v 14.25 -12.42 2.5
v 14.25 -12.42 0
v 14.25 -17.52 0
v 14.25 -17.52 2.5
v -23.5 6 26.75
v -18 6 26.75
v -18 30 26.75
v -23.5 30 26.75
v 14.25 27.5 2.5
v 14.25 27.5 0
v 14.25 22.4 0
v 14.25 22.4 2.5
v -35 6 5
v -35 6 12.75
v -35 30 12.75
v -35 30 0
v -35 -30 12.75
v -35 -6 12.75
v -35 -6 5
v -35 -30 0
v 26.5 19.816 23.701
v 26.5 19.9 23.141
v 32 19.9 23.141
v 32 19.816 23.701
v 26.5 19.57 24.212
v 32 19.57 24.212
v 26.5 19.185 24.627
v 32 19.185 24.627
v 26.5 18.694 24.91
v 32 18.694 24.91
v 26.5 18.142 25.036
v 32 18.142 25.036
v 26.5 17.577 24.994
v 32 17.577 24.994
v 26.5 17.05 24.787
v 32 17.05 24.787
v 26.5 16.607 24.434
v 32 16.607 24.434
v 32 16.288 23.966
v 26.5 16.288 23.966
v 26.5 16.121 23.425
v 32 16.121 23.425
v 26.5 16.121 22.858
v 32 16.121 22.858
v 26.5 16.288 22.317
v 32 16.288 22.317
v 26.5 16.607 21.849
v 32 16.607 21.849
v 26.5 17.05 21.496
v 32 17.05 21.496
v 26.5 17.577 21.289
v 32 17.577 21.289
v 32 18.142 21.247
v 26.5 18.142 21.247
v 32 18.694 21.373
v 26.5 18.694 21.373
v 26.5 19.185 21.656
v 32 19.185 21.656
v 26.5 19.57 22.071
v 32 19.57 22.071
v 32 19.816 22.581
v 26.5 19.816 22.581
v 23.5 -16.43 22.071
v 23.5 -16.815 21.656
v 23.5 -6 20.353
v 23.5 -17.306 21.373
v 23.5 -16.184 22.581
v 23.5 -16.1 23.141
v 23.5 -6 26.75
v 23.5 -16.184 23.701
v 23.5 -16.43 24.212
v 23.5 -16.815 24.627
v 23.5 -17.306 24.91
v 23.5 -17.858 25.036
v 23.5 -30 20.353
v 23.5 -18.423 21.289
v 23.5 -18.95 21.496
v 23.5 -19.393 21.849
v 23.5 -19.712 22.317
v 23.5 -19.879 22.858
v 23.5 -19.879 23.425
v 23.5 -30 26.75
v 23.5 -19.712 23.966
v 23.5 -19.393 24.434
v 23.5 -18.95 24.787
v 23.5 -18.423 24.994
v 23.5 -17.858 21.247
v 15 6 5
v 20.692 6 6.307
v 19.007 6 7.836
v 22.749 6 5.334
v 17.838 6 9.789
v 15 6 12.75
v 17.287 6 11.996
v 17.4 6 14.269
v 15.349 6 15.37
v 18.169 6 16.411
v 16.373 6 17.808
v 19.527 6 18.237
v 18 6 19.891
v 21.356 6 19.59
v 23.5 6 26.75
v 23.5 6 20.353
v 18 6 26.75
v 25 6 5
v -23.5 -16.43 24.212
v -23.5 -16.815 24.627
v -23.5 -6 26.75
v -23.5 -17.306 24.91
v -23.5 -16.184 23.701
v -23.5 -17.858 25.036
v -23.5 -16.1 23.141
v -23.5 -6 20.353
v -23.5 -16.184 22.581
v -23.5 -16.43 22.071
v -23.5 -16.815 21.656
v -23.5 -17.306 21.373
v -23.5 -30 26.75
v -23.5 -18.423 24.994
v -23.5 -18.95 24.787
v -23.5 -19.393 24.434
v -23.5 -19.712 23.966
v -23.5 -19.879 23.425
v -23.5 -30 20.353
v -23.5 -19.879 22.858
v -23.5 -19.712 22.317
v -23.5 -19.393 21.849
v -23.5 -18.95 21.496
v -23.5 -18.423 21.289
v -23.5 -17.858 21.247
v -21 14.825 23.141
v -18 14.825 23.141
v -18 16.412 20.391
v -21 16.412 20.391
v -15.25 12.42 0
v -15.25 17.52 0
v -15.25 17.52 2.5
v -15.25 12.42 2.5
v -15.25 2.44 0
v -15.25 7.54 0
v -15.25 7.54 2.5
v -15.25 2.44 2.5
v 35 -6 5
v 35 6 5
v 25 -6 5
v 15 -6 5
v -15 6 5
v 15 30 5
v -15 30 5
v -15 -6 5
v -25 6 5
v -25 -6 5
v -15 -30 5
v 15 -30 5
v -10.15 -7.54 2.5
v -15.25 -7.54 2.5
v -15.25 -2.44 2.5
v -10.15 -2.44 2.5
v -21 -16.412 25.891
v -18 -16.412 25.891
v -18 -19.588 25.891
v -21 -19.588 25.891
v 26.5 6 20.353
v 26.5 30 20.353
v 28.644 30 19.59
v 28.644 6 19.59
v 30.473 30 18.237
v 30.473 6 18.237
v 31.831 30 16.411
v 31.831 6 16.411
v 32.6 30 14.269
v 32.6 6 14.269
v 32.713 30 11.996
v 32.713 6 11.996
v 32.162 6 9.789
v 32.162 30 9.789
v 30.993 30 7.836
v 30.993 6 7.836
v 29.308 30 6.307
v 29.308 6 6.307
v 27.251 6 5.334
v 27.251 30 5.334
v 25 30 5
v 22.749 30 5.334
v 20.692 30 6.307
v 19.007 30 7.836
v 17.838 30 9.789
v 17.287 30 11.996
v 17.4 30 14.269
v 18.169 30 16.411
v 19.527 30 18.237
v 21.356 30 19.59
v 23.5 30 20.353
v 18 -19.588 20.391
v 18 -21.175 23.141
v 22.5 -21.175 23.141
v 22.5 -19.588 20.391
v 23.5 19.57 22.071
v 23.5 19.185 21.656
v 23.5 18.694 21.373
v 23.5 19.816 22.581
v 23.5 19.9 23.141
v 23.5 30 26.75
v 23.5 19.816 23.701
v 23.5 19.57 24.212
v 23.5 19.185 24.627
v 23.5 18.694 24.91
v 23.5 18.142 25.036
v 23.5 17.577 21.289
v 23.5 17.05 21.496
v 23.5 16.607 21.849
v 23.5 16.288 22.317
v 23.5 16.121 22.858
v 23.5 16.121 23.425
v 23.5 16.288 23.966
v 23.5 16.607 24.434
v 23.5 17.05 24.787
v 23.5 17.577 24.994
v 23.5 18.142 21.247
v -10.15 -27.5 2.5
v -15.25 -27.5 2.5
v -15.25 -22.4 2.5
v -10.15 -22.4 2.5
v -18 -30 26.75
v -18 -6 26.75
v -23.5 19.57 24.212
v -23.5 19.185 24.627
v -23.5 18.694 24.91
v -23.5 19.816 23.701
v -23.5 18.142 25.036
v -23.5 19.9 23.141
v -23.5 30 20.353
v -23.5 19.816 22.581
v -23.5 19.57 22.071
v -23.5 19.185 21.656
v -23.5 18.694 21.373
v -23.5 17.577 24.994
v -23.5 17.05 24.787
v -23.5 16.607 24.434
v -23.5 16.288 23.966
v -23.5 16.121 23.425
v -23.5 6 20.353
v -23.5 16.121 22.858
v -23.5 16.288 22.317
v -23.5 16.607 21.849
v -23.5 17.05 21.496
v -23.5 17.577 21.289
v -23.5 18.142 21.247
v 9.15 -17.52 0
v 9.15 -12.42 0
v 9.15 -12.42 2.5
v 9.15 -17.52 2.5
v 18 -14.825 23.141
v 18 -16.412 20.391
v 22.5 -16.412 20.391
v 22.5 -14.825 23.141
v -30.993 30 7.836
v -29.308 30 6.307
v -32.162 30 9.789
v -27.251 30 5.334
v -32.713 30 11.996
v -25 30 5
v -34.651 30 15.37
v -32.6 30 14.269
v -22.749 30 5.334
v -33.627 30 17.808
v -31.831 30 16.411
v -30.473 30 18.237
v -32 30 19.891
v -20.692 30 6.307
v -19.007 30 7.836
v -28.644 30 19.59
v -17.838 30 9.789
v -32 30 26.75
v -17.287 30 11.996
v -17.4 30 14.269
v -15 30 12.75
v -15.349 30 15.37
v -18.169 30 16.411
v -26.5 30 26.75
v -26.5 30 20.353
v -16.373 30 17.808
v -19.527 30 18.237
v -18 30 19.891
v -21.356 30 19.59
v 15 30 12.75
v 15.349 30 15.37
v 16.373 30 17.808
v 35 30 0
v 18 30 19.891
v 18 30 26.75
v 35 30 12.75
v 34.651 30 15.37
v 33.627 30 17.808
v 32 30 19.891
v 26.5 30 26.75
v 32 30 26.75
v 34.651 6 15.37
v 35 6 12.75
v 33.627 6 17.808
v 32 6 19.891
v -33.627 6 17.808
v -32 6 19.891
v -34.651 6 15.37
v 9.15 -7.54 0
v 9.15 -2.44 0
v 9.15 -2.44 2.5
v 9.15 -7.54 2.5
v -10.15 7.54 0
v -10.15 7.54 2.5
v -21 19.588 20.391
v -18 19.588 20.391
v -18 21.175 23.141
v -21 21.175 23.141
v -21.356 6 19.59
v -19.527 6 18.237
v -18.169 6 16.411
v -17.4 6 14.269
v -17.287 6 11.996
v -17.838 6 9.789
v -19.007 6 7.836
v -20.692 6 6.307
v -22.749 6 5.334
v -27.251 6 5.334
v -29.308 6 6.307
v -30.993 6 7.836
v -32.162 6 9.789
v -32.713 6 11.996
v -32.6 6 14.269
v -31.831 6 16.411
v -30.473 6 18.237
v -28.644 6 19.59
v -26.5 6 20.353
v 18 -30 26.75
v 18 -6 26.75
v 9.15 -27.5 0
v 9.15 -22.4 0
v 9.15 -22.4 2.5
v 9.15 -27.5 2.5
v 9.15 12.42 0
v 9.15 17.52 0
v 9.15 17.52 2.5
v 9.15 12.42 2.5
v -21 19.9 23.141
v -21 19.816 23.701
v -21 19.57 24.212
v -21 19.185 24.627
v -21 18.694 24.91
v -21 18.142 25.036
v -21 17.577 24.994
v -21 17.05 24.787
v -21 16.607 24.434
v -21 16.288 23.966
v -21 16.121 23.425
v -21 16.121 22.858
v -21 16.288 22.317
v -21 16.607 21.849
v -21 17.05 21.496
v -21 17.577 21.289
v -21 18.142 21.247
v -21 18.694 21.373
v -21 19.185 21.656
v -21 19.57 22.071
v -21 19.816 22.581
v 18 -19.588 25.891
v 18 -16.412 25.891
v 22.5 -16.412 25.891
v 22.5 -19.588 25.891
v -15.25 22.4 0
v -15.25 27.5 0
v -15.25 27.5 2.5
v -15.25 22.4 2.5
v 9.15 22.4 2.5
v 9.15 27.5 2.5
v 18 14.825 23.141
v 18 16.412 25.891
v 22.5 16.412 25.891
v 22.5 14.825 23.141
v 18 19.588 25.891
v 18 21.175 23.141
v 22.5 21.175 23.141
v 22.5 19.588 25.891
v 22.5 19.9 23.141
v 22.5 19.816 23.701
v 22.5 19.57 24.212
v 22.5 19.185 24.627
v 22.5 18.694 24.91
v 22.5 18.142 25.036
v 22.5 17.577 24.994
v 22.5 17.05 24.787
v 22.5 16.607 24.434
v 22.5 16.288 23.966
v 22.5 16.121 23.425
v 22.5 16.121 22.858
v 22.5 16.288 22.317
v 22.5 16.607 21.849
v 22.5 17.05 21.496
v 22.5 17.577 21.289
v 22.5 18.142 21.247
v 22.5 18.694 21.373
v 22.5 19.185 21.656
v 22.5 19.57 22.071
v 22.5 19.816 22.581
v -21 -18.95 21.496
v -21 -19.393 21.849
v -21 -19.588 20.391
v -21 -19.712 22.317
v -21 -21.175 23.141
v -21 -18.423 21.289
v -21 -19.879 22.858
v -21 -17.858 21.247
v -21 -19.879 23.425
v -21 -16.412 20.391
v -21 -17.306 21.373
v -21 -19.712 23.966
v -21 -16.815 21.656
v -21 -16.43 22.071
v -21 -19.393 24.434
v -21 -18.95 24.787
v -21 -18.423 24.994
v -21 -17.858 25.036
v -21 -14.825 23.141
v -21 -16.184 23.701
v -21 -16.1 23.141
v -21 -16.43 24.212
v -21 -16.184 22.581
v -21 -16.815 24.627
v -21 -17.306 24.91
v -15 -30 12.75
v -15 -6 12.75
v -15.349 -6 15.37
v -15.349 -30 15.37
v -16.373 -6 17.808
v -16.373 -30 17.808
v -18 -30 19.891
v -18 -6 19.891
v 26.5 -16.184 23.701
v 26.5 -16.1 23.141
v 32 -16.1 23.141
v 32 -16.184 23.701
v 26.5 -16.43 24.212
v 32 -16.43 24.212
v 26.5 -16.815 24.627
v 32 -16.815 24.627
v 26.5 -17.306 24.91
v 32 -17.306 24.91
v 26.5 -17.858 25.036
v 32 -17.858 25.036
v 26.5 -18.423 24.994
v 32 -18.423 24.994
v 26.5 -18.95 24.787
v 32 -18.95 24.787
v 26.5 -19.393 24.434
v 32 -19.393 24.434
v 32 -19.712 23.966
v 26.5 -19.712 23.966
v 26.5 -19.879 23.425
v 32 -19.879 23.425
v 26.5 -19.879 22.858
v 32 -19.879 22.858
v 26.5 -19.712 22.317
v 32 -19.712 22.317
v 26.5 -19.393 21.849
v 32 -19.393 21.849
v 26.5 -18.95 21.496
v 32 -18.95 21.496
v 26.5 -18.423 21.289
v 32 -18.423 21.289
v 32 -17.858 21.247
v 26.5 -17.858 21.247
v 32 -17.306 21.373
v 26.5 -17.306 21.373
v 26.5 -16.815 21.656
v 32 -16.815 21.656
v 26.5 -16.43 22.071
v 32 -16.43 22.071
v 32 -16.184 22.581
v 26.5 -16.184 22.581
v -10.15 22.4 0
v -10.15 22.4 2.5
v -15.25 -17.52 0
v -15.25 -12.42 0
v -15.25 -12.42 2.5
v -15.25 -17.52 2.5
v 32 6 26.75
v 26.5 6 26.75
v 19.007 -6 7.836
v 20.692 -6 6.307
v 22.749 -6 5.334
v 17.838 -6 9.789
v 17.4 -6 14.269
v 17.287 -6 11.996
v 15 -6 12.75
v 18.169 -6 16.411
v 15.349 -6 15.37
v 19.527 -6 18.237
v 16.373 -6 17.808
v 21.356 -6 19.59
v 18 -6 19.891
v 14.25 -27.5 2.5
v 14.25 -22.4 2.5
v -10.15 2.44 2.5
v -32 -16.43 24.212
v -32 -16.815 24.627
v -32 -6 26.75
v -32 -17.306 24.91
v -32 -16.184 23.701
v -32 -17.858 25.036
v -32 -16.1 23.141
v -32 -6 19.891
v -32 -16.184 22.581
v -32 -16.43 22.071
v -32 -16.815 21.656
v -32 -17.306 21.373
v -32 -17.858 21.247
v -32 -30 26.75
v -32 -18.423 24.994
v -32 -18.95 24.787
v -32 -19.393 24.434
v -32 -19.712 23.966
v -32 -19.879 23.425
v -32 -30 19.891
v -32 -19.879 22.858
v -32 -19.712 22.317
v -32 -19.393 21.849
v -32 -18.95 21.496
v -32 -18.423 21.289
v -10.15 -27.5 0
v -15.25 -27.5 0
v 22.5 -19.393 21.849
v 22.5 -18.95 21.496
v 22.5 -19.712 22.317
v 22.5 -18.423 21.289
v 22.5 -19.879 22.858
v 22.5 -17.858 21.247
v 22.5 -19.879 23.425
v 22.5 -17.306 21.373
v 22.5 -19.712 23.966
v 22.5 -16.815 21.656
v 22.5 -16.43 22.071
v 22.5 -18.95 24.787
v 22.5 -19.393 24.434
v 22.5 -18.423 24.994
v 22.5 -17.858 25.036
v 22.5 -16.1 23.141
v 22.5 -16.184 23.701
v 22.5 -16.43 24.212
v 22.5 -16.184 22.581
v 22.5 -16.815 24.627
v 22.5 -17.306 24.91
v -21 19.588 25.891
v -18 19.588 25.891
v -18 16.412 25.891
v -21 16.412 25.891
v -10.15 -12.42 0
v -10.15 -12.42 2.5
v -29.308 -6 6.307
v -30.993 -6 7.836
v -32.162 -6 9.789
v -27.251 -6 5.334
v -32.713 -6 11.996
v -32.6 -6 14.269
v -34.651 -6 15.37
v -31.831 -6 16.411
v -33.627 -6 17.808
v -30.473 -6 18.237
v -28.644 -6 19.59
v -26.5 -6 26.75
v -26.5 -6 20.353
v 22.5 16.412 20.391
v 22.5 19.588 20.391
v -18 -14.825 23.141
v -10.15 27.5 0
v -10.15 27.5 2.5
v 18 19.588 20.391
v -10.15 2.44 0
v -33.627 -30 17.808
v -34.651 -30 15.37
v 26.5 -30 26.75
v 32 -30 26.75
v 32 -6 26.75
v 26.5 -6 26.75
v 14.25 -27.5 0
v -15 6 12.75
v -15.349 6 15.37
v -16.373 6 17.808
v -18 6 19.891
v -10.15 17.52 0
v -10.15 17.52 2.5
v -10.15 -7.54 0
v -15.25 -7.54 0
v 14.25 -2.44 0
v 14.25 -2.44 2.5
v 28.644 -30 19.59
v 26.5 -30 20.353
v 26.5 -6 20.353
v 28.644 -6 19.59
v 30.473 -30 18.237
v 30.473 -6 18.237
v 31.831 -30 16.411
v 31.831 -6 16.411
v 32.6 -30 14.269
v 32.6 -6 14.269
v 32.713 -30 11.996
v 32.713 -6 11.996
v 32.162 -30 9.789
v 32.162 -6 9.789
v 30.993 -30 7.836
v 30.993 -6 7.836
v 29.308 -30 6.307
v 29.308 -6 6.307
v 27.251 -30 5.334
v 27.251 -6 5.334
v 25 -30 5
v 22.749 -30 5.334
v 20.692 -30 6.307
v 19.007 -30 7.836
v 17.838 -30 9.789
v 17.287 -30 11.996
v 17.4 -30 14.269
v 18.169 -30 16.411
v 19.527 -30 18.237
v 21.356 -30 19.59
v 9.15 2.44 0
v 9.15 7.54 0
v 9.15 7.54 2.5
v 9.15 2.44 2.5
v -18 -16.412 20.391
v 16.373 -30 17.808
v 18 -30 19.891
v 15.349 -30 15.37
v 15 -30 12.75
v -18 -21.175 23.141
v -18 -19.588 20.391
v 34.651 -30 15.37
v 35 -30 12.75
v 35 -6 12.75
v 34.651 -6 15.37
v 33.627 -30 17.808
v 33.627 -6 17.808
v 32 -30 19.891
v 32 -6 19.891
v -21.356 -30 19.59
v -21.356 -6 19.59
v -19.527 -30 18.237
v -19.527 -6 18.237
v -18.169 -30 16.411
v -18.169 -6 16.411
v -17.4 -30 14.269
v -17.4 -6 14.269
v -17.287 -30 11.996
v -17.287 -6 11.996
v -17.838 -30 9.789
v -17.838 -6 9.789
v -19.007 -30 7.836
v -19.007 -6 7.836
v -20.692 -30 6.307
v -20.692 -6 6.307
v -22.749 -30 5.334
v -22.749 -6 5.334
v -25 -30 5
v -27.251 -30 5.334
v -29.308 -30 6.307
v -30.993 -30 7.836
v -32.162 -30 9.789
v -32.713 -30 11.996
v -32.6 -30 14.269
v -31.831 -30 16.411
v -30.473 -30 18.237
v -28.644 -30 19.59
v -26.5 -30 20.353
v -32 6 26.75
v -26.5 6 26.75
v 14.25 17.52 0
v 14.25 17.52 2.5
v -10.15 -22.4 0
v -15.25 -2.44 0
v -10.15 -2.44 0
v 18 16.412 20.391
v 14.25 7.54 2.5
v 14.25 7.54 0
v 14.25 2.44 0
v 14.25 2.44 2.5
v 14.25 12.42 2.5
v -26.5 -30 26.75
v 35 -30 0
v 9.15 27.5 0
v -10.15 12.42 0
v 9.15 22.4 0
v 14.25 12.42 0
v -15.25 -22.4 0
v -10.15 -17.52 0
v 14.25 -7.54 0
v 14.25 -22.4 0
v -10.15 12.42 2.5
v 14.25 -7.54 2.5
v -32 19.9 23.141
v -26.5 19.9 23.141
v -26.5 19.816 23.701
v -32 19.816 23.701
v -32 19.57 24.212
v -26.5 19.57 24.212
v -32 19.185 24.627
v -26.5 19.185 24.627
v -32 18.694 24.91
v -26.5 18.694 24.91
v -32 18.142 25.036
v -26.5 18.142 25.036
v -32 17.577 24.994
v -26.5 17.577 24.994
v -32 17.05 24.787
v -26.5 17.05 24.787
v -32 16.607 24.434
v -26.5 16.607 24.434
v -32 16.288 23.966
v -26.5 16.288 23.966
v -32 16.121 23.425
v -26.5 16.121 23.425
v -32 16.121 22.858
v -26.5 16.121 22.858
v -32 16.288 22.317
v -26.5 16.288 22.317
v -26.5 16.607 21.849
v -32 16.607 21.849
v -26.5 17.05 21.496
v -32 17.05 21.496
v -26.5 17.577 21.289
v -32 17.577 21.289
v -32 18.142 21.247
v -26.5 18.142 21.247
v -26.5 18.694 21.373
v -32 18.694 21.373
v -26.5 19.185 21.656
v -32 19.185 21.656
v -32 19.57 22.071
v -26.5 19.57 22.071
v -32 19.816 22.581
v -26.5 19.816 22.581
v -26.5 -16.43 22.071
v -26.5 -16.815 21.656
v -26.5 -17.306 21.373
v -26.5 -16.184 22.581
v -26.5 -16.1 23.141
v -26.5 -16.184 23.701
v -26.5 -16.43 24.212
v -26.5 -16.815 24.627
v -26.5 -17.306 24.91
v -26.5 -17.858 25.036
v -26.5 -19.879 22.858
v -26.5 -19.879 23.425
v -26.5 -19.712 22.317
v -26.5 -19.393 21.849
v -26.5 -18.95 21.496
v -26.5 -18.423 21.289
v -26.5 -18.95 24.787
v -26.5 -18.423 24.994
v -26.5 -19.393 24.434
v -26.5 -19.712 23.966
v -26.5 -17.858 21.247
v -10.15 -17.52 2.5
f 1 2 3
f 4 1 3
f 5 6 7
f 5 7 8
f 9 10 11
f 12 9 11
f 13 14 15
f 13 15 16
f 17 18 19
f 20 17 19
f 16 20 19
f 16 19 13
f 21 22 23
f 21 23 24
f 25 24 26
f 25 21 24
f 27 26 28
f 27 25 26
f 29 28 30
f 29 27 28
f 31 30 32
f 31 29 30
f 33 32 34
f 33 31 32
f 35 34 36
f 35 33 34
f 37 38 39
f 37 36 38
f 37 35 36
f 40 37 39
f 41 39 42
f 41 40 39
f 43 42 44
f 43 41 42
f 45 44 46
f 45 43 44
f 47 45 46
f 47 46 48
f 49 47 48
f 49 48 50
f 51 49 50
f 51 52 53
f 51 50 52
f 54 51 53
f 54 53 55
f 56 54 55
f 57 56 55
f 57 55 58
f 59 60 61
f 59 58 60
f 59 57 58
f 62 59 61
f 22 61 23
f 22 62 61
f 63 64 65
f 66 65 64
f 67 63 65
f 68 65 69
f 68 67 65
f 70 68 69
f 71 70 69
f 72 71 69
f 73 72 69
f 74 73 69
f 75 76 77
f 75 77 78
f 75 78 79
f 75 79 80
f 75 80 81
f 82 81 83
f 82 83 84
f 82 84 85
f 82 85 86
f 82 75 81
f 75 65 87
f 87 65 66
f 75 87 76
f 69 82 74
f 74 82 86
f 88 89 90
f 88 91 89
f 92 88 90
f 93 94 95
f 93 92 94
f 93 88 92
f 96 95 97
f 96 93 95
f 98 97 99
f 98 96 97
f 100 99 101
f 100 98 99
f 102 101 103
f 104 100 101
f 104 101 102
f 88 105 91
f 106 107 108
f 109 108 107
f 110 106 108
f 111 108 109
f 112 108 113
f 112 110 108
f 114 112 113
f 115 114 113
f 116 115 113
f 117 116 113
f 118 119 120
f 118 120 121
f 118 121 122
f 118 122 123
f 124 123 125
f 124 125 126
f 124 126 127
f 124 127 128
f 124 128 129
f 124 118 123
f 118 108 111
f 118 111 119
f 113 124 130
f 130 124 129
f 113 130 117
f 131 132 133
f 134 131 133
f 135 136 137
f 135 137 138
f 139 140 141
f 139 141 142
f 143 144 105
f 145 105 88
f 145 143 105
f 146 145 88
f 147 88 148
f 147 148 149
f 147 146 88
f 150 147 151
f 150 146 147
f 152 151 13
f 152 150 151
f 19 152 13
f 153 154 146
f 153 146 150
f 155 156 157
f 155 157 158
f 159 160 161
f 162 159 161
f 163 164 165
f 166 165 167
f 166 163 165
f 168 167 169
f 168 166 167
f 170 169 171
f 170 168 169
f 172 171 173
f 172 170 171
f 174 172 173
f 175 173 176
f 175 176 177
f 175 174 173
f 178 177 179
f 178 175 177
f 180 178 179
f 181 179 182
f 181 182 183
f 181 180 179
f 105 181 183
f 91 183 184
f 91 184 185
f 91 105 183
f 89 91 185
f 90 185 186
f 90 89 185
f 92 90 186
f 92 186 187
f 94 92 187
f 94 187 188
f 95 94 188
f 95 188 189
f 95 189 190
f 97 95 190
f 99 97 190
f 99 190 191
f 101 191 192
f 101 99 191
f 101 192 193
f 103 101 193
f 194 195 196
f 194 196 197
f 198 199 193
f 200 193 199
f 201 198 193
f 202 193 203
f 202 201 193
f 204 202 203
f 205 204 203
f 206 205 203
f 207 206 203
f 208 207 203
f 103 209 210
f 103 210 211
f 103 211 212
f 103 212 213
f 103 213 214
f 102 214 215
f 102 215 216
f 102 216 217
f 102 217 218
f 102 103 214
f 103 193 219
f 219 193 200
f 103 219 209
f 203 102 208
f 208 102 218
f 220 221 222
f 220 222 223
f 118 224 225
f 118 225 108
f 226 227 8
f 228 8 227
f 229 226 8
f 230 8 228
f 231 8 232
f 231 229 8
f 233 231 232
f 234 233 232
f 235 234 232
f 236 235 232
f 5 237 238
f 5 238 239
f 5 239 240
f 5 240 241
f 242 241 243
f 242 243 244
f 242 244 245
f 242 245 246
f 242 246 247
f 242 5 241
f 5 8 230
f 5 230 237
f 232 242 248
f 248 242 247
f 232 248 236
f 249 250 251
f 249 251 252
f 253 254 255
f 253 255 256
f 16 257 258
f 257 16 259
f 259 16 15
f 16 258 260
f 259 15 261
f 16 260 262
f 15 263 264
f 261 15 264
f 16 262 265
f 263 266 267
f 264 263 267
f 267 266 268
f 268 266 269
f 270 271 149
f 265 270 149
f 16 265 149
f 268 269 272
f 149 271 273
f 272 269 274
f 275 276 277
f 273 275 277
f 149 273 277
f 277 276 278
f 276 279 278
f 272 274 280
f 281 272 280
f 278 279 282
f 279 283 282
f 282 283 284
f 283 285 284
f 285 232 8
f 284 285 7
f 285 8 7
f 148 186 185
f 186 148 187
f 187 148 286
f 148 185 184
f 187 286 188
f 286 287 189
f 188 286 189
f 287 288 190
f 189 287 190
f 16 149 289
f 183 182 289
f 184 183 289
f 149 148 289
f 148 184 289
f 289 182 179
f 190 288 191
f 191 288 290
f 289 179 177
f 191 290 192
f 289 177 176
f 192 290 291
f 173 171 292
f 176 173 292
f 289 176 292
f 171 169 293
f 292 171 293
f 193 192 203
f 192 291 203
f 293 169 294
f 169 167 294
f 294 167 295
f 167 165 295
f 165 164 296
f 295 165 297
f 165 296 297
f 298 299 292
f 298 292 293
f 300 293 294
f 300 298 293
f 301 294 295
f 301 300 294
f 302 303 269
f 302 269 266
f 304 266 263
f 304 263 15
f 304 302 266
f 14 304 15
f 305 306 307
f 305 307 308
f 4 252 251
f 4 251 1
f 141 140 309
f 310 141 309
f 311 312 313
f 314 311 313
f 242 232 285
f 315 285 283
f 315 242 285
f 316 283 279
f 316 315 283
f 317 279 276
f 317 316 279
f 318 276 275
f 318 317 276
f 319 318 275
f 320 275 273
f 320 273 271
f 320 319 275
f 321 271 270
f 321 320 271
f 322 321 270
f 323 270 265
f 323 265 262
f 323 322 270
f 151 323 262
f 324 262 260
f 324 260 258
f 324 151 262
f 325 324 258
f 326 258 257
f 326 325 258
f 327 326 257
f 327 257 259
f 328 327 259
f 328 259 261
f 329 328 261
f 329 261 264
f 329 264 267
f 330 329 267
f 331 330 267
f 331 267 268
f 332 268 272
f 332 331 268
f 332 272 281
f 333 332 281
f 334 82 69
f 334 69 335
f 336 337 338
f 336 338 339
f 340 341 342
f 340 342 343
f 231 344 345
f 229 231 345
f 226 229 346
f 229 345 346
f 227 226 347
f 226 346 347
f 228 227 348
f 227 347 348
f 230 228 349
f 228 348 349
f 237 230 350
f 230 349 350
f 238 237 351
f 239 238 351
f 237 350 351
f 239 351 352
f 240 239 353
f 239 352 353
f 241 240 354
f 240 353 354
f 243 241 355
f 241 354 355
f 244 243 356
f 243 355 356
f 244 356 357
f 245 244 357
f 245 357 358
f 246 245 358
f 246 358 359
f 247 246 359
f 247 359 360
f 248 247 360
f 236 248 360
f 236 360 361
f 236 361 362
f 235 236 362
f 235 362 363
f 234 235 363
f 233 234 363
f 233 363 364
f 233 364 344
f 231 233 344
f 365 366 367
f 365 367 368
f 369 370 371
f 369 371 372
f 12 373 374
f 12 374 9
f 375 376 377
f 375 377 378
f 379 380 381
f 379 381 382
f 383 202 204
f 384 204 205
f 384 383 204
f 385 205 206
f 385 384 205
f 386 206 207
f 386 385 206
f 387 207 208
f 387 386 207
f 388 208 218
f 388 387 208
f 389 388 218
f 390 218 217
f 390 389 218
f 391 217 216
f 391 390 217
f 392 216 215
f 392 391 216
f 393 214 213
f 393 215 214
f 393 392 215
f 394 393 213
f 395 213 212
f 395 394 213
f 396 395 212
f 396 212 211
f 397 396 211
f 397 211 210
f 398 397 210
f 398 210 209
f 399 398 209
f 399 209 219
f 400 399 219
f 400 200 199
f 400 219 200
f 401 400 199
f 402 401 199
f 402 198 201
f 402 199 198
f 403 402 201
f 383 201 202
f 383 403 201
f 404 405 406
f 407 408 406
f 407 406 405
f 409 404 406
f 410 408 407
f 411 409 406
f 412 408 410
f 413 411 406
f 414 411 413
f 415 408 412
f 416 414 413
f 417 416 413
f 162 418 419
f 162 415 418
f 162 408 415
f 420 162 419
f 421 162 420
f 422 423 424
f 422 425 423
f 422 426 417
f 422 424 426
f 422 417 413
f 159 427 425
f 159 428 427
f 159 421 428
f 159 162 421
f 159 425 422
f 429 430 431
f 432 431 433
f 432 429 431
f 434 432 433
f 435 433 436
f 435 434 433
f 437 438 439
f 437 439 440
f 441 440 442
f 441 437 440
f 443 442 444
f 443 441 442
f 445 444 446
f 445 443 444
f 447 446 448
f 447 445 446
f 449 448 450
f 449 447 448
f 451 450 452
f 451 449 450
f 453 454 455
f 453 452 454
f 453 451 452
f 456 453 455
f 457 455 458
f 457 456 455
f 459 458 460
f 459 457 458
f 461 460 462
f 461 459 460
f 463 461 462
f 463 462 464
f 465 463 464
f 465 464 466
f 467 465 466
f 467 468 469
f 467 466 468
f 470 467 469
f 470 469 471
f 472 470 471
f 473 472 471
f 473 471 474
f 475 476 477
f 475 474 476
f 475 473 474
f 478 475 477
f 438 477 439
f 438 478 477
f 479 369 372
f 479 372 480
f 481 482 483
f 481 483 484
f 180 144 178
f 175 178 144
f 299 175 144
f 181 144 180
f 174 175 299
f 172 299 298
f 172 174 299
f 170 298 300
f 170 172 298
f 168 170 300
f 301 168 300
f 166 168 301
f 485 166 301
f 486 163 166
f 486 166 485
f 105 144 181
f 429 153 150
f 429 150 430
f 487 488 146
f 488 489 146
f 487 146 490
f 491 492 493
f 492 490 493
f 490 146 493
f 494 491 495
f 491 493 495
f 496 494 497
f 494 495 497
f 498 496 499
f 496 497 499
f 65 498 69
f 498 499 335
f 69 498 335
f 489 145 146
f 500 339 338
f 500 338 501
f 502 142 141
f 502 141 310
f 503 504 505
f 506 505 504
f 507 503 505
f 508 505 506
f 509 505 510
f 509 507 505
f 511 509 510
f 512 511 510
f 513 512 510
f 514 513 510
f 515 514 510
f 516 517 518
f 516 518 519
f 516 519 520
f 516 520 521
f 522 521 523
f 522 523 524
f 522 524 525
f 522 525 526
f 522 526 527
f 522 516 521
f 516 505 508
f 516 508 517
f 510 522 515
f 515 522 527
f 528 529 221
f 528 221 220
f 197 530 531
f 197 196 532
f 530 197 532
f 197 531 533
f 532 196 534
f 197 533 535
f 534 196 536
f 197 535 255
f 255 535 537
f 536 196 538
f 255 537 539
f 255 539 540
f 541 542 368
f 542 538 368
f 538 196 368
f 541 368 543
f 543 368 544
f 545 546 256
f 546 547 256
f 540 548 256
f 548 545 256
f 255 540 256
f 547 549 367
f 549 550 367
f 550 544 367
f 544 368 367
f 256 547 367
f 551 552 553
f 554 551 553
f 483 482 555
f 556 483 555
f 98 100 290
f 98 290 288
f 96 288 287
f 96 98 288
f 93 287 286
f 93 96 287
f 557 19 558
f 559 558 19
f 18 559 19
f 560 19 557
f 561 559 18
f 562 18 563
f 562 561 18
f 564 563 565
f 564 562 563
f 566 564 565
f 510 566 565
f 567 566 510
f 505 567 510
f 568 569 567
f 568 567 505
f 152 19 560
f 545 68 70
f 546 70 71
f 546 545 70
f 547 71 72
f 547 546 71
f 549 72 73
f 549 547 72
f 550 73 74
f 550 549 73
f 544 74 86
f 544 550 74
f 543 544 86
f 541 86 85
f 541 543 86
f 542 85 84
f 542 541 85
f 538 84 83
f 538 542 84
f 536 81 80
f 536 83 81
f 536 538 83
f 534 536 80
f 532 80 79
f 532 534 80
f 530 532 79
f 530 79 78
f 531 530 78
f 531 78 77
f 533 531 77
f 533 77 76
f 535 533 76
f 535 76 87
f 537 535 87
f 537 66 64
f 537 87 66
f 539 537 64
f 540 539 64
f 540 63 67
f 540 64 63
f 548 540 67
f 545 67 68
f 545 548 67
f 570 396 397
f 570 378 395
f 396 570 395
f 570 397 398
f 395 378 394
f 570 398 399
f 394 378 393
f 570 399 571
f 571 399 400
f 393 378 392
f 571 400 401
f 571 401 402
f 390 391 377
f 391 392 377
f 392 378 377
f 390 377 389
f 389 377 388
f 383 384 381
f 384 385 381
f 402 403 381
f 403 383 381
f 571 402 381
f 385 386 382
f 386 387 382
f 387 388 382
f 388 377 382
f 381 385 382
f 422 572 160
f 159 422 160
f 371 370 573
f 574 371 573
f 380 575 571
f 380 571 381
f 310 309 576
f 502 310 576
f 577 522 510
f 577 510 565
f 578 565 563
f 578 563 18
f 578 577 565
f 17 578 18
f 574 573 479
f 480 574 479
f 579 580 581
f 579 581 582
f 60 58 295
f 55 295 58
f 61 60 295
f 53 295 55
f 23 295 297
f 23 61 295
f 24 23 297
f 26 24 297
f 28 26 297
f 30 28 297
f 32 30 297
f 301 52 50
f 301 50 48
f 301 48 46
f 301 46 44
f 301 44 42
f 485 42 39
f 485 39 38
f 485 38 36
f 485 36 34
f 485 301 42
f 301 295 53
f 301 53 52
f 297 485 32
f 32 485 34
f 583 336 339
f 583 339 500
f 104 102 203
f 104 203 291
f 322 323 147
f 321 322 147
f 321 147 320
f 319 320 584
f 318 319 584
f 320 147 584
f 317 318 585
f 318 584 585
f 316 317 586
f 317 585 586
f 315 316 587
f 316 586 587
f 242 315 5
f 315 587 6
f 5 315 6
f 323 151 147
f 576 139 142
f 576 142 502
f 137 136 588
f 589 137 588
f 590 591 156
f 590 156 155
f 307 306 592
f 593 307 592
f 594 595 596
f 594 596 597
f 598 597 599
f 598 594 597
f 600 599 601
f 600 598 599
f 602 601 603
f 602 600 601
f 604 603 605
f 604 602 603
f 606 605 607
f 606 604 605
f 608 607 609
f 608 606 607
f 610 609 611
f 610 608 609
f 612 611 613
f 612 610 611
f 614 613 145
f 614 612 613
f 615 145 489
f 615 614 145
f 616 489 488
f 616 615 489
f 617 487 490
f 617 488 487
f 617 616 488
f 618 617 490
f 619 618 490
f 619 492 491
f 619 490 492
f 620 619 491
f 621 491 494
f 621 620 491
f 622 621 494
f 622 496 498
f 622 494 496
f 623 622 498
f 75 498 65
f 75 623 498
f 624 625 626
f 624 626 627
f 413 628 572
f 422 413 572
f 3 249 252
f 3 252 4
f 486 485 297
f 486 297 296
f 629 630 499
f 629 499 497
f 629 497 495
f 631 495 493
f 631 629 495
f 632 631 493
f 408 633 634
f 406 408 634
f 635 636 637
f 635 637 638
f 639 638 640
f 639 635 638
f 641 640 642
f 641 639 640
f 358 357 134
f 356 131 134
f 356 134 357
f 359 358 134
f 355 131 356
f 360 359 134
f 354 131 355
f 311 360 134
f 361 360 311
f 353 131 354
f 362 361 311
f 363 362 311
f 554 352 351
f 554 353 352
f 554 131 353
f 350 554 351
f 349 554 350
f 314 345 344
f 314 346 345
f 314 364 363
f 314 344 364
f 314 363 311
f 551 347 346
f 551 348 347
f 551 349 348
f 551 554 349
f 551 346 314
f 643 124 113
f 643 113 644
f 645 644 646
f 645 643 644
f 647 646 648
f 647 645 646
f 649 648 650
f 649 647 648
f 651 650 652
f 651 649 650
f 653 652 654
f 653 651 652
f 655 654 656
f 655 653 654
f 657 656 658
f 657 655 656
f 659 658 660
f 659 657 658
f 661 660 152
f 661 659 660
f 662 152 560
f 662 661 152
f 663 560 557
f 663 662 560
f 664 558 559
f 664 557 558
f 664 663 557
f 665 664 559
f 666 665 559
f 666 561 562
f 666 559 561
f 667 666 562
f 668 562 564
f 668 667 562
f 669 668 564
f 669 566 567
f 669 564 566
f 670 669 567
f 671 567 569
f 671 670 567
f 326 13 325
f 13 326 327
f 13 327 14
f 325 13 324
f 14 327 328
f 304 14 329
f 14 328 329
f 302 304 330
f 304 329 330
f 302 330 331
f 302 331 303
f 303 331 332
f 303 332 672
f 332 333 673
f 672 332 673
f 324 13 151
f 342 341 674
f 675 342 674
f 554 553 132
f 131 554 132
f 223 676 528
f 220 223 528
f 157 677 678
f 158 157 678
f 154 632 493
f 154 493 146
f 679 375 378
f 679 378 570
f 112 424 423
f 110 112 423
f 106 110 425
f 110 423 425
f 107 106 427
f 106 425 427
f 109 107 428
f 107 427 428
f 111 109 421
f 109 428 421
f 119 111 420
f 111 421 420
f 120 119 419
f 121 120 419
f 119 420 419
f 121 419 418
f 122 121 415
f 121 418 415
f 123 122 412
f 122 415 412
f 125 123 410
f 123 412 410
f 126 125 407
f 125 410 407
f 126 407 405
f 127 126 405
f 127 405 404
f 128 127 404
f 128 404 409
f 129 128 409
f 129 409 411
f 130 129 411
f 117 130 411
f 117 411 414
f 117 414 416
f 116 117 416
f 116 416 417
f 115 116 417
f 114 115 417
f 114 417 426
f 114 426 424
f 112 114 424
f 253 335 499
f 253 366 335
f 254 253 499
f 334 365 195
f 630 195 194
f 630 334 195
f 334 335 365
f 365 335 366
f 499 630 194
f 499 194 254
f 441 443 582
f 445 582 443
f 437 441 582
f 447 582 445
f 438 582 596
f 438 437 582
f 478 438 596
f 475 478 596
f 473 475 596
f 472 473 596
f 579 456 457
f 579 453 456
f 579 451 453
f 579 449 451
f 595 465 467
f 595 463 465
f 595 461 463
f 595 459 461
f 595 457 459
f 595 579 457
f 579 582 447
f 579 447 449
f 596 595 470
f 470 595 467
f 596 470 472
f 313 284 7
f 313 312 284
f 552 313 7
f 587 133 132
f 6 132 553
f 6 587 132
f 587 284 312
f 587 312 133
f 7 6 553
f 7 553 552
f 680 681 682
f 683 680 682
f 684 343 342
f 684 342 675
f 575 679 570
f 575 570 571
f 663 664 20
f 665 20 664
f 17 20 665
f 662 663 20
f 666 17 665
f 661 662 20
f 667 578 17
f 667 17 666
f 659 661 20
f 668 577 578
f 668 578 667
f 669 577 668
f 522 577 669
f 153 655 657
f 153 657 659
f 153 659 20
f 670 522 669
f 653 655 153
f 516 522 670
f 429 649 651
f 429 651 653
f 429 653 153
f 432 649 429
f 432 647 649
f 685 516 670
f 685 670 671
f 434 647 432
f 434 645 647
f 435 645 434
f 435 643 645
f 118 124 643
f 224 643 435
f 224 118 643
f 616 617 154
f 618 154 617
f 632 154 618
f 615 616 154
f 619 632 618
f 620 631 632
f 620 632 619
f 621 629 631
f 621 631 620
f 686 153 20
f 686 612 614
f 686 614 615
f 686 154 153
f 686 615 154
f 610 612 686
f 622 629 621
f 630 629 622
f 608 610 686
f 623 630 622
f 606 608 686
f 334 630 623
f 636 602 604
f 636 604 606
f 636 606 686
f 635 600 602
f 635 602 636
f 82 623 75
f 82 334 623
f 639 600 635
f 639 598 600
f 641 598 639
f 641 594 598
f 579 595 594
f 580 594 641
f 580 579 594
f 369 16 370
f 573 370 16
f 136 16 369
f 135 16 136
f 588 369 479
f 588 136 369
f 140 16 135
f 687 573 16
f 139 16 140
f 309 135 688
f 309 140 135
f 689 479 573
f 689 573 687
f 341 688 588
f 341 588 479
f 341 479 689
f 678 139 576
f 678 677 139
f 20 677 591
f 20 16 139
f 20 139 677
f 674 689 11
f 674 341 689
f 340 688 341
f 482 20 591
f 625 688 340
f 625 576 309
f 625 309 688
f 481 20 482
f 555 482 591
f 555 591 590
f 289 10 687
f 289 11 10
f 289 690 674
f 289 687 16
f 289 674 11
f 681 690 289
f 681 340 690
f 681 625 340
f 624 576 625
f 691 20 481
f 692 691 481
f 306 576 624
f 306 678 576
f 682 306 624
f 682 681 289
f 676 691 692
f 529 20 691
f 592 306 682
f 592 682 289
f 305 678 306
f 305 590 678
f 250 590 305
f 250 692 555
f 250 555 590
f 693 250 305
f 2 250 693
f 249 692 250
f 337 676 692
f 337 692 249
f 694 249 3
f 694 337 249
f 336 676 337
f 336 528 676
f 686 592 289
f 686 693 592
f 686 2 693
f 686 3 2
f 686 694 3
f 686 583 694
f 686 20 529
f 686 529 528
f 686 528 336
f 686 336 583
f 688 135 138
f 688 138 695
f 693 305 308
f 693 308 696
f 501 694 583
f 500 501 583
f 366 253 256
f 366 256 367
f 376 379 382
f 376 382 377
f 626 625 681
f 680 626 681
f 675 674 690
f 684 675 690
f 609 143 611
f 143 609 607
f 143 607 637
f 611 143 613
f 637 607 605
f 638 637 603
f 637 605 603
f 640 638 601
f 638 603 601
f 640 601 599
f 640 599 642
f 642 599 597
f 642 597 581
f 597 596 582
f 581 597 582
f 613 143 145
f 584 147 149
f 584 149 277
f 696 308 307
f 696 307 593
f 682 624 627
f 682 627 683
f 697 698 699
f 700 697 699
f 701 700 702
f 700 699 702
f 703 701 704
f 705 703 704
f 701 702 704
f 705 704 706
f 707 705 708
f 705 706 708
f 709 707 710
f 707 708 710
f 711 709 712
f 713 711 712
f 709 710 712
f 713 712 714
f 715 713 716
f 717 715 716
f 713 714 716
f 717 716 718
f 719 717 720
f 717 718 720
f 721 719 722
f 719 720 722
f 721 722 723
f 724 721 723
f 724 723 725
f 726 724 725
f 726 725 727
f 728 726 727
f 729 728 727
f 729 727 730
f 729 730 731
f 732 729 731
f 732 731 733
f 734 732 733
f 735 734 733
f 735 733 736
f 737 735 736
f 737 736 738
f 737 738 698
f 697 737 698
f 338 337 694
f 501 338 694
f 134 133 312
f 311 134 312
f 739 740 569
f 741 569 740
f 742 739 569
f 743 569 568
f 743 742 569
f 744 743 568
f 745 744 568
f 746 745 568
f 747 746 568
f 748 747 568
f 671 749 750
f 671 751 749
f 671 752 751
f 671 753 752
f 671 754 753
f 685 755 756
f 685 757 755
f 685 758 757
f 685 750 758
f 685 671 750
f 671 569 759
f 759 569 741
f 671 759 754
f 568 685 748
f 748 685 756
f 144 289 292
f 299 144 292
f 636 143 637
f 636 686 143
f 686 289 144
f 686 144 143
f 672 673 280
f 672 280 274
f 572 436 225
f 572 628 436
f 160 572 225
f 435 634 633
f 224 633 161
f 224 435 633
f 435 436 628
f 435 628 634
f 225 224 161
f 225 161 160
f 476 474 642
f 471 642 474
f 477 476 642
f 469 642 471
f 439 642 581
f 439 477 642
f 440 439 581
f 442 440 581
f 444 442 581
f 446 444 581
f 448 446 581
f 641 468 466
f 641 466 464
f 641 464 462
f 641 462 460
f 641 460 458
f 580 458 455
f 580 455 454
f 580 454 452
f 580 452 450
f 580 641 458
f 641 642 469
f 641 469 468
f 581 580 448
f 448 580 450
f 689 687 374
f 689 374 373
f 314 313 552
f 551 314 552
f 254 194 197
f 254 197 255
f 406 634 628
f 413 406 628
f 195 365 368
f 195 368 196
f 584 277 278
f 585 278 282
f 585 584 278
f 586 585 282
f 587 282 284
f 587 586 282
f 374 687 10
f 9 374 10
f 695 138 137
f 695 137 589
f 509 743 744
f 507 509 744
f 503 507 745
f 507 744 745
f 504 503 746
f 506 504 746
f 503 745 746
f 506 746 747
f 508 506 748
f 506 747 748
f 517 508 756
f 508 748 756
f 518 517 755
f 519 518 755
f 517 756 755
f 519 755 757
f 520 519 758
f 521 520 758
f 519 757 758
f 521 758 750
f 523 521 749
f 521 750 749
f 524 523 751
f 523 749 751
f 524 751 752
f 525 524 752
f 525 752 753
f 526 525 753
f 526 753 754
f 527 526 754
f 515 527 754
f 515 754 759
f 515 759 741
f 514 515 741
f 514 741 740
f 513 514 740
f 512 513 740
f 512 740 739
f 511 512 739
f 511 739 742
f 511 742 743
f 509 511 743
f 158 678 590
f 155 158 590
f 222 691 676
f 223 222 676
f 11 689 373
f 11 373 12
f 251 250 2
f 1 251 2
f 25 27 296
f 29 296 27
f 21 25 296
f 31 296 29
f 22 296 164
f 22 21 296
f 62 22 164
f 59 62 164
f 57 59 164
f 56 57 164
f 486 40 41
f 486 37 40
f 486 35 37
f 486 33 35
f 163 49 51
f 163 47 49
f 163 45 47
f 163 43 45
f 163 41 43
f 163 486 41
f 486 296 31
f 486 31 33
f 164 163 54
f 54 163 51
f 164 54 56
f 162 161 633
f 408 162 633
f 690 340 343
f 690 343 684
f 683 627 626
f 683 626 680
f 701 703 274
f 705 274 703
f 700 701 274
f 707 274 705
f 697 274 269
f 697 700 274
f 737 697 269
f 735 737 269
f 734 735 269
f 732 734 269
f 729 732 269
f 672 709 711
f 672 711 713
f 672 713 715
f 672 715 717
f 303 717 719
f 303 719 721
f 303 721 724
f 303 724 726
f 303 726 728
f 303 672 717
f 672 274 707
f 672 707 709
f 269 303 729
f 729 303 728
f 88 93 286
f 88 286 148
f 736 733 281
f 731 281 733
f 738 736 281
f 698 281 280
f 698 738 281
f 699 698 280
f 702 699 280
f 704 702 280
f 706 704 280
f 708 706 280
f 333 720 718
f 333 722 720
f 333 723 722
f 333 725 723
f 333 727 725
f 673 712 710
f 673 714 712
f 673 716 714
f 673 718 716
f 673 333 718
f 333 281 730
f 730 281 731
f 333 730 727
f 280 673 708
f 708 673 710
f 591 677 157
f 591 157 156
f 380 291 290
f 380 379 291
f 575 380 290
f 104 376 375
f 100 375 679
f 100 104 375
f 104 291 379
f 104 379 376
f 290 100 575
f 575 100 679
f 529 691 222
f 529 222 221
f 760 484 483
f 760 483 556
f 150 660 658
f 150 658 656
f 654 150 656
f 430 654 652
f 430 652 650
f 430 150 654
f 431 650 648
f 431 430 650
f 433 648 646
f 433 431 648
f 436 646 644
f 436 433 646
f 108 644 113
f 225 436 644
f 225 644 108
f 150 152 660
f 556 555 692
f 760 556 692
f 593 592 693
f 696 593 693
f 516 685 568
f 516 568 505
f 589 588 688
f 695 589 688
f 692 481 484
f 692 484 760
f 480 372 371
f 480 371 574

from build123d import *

# Parameters (mm, degrees)
F1_DEPTH      = 30
F2_W          = 12
F2_H          = 21.75
F3_DEPTH      = 20.001
F3_DEPTH_BACK = 50.001
F4_R          = 1.9
F5_DEPTH      = 3
F5_DEPTH_BACK = 40.5
F6_DEPTH      = 17.001
F6_DEPTH_BACK = 53.001
F7_W          = 5.1
F7_H          = 5.1
F8_DEPTH      = 2.5


with BuildPart() as f1:
    # F0 (on Front) → F1 (new body, symmetric)
    with BuildSketch(Plane.XZ):
        with BuildLine():
            Line((-35, 0), (0, 0))
            Line((0, 0), (35, 0))
            Line((35, 0), (35, 12.75))
            ThreePointArc((35, 12.75), (34.2195444573, 16.6229833462), (32, 19.8914284285))
            Line((32, 19.8914284285), (32, 26.75))
            Line((32, 26.75), (26.5, 26.75))
            Line((26.5, 26.75), (26.5, 20.3534531629))
            ThreePointArc((26.5, 20.3534531629), (25, 5), (23.5, 20.3534531629))
            Line((23.5, 20.3534531629), (23.5, 26.75))
            Line((23.5, 26.75), (18, 26.75))
            Line((18, 26.75), (18, 19.8914284285))
            ThreePointArc((18, 19.8914284285), (15.7804555427, 16.6229833462), (15, 12.75))
            Line((15, 12.75), (15, 5))
            Line((15, 5), (0, 5))
            Line((0, 5), (-15, 5))
            Line((-15, 5), (-15, 12.75))
            ThreePointArc((-15, 12.75), (-15.7804555427, 16.6229833462), (-18, 19.8914284285))
            Line((-18, 19.8914284285), (-18, 26.75))
            Line((-18, 26.75), (-23.5, 26.75))
            Line((-23.5, 26.75), (-23.5, 20.3534531629))
            ThreePointArc((-23.5, 20.3534531629), (-25, 5), (-26.5, 20.3534531629))
            Line((-26.5, 20.3534531629), (-26.5, 26.75))
            Line((-26.5, 26.75), (-32, 26.75))
            Line((-32, 26.75), (-32, 19.8914284285))
            ThreePointArc((-32, 19.8914284285), (-34.2195444573, 16.6229833462), (-35, 12.75))
            Line((-35, 12.75), (-35, 0))
        make_face()
    extrude(amount=F1_DEPTH, both=True)

    # F2 (on face) → F3 (cut, two sides)
    with BuildSketch(Plane(origin=(15, 0, 0), x_dir=(0, -1, 0), z_dir=(-1, 0, 0))) as f3_sk:
        with Locations((0, 15.875)):
            Rectangle(F2_W, F2_H)
    extrude(amount=-F3_DEPTH, mode=Mode.SUBTRACT)
    extrude(f3_sk.sketch, amount=F3_DEPTH_BACK, mode=Mode.SUBTRACT)

    # F4 (on face) → F5 (cut, two sides)
    with BuildSketch(Plane.YZ.offset(-18)) as f5_sk:
        Polygon((-16.4122867597, 20.3914284285), (-14.8245735195, 23.1414284285), (-16.4122867597, 25.8914284285), (-19.5877132403, 25.8914284285), (-21.1754264805, 23.1414284285), (-19.5877132403, 20.3914284285), align=None)
        with Locations((-18, 23.1414284285)):
            Circle(F4_R, mode=Mode.SUBTRACT)
        Polygon((19.5877132403, 25.8914284285), (16.4122867597, 25.8914284285), (14.8245735195, 23.1414284285), (16.4122867597, 20.3914284285), (19.5877132403, 20.3914284285), (21.1754264805, 23.1414284285), align=None)
        with Locations((18, 23.1414284285)):
            Circle(F4_R, mode=Mode.SUBTRACT)
    extrude(amount=-F5_DEPTH, mode=Mode.SUBTRACT)
    extrude(f5_sk.sketch, amount=F5_DEPTH_BACK, mode=Mode.SUBTRACT)

    # F4 (on face) → F6 (cut, two sides)
    with BuildSketch(Plane.YZ.offset(-18)) as f6_sk:
        with Locations((18, 23.1414284285)):
            Circle(F4_R)
        with Locations((-18, 23.1414284285)):
            Circle(F4_R)
    extrude(amount=-F6_DEPTH, mode=Mode.SUBTRACT)
    extrude(f6_sk.sketch, amount=F6_DEPTH_BACK, mode=Mode.SUBTRACT)

    # F7 (on face) → F8 (cut)
    with BuildSketch(Plane(origin=(0, 0, 0), x_dir=(1, 0, 0), z_dir=(0, 0, -1))):
        with Locations((-12.7, 24.95)):
            Rectangle(F7_W, F7_H)
        with Locations((11.7, 24.95)):
            Rectangle(F7_W, F7_H)
        with Locations((-12.7, 14.97)):
            Rectangle(F7_W, F7_H)
        with Locations((11.7, 14.97)):
            Rectangle(F7_W, F7_H)
        with Locations((-12.7, 4.99)):
            Rectangle(F7_W, F7_H)
        with Locations((11.7, 4.99)):
            Rectangle(F7_W, F7_H)
        with Locations((-12.7, -4.99)):
            Rectangle(F7_W, F7_H)
        with Locations((11.7, -4.99)):
            Rectangle(F7_W, F7_H)
        with Locations((-12.7, -14.97)):
            Rectangle(F7_W, F7_H)
        with Locations((11.7, -14.97)):
            Rectangle(F7_W, F7_H)
        with Locations((-12.7, -24.95)):
            Rectangle(F7_W, F7_H)
        with Locations((11.7, -24.95)):
            Rectangle(F7_W, F7_H)
    extrude(amount=-F8_DEPTH, mode=Mode.SUBTRACT)


solid = f1.part
